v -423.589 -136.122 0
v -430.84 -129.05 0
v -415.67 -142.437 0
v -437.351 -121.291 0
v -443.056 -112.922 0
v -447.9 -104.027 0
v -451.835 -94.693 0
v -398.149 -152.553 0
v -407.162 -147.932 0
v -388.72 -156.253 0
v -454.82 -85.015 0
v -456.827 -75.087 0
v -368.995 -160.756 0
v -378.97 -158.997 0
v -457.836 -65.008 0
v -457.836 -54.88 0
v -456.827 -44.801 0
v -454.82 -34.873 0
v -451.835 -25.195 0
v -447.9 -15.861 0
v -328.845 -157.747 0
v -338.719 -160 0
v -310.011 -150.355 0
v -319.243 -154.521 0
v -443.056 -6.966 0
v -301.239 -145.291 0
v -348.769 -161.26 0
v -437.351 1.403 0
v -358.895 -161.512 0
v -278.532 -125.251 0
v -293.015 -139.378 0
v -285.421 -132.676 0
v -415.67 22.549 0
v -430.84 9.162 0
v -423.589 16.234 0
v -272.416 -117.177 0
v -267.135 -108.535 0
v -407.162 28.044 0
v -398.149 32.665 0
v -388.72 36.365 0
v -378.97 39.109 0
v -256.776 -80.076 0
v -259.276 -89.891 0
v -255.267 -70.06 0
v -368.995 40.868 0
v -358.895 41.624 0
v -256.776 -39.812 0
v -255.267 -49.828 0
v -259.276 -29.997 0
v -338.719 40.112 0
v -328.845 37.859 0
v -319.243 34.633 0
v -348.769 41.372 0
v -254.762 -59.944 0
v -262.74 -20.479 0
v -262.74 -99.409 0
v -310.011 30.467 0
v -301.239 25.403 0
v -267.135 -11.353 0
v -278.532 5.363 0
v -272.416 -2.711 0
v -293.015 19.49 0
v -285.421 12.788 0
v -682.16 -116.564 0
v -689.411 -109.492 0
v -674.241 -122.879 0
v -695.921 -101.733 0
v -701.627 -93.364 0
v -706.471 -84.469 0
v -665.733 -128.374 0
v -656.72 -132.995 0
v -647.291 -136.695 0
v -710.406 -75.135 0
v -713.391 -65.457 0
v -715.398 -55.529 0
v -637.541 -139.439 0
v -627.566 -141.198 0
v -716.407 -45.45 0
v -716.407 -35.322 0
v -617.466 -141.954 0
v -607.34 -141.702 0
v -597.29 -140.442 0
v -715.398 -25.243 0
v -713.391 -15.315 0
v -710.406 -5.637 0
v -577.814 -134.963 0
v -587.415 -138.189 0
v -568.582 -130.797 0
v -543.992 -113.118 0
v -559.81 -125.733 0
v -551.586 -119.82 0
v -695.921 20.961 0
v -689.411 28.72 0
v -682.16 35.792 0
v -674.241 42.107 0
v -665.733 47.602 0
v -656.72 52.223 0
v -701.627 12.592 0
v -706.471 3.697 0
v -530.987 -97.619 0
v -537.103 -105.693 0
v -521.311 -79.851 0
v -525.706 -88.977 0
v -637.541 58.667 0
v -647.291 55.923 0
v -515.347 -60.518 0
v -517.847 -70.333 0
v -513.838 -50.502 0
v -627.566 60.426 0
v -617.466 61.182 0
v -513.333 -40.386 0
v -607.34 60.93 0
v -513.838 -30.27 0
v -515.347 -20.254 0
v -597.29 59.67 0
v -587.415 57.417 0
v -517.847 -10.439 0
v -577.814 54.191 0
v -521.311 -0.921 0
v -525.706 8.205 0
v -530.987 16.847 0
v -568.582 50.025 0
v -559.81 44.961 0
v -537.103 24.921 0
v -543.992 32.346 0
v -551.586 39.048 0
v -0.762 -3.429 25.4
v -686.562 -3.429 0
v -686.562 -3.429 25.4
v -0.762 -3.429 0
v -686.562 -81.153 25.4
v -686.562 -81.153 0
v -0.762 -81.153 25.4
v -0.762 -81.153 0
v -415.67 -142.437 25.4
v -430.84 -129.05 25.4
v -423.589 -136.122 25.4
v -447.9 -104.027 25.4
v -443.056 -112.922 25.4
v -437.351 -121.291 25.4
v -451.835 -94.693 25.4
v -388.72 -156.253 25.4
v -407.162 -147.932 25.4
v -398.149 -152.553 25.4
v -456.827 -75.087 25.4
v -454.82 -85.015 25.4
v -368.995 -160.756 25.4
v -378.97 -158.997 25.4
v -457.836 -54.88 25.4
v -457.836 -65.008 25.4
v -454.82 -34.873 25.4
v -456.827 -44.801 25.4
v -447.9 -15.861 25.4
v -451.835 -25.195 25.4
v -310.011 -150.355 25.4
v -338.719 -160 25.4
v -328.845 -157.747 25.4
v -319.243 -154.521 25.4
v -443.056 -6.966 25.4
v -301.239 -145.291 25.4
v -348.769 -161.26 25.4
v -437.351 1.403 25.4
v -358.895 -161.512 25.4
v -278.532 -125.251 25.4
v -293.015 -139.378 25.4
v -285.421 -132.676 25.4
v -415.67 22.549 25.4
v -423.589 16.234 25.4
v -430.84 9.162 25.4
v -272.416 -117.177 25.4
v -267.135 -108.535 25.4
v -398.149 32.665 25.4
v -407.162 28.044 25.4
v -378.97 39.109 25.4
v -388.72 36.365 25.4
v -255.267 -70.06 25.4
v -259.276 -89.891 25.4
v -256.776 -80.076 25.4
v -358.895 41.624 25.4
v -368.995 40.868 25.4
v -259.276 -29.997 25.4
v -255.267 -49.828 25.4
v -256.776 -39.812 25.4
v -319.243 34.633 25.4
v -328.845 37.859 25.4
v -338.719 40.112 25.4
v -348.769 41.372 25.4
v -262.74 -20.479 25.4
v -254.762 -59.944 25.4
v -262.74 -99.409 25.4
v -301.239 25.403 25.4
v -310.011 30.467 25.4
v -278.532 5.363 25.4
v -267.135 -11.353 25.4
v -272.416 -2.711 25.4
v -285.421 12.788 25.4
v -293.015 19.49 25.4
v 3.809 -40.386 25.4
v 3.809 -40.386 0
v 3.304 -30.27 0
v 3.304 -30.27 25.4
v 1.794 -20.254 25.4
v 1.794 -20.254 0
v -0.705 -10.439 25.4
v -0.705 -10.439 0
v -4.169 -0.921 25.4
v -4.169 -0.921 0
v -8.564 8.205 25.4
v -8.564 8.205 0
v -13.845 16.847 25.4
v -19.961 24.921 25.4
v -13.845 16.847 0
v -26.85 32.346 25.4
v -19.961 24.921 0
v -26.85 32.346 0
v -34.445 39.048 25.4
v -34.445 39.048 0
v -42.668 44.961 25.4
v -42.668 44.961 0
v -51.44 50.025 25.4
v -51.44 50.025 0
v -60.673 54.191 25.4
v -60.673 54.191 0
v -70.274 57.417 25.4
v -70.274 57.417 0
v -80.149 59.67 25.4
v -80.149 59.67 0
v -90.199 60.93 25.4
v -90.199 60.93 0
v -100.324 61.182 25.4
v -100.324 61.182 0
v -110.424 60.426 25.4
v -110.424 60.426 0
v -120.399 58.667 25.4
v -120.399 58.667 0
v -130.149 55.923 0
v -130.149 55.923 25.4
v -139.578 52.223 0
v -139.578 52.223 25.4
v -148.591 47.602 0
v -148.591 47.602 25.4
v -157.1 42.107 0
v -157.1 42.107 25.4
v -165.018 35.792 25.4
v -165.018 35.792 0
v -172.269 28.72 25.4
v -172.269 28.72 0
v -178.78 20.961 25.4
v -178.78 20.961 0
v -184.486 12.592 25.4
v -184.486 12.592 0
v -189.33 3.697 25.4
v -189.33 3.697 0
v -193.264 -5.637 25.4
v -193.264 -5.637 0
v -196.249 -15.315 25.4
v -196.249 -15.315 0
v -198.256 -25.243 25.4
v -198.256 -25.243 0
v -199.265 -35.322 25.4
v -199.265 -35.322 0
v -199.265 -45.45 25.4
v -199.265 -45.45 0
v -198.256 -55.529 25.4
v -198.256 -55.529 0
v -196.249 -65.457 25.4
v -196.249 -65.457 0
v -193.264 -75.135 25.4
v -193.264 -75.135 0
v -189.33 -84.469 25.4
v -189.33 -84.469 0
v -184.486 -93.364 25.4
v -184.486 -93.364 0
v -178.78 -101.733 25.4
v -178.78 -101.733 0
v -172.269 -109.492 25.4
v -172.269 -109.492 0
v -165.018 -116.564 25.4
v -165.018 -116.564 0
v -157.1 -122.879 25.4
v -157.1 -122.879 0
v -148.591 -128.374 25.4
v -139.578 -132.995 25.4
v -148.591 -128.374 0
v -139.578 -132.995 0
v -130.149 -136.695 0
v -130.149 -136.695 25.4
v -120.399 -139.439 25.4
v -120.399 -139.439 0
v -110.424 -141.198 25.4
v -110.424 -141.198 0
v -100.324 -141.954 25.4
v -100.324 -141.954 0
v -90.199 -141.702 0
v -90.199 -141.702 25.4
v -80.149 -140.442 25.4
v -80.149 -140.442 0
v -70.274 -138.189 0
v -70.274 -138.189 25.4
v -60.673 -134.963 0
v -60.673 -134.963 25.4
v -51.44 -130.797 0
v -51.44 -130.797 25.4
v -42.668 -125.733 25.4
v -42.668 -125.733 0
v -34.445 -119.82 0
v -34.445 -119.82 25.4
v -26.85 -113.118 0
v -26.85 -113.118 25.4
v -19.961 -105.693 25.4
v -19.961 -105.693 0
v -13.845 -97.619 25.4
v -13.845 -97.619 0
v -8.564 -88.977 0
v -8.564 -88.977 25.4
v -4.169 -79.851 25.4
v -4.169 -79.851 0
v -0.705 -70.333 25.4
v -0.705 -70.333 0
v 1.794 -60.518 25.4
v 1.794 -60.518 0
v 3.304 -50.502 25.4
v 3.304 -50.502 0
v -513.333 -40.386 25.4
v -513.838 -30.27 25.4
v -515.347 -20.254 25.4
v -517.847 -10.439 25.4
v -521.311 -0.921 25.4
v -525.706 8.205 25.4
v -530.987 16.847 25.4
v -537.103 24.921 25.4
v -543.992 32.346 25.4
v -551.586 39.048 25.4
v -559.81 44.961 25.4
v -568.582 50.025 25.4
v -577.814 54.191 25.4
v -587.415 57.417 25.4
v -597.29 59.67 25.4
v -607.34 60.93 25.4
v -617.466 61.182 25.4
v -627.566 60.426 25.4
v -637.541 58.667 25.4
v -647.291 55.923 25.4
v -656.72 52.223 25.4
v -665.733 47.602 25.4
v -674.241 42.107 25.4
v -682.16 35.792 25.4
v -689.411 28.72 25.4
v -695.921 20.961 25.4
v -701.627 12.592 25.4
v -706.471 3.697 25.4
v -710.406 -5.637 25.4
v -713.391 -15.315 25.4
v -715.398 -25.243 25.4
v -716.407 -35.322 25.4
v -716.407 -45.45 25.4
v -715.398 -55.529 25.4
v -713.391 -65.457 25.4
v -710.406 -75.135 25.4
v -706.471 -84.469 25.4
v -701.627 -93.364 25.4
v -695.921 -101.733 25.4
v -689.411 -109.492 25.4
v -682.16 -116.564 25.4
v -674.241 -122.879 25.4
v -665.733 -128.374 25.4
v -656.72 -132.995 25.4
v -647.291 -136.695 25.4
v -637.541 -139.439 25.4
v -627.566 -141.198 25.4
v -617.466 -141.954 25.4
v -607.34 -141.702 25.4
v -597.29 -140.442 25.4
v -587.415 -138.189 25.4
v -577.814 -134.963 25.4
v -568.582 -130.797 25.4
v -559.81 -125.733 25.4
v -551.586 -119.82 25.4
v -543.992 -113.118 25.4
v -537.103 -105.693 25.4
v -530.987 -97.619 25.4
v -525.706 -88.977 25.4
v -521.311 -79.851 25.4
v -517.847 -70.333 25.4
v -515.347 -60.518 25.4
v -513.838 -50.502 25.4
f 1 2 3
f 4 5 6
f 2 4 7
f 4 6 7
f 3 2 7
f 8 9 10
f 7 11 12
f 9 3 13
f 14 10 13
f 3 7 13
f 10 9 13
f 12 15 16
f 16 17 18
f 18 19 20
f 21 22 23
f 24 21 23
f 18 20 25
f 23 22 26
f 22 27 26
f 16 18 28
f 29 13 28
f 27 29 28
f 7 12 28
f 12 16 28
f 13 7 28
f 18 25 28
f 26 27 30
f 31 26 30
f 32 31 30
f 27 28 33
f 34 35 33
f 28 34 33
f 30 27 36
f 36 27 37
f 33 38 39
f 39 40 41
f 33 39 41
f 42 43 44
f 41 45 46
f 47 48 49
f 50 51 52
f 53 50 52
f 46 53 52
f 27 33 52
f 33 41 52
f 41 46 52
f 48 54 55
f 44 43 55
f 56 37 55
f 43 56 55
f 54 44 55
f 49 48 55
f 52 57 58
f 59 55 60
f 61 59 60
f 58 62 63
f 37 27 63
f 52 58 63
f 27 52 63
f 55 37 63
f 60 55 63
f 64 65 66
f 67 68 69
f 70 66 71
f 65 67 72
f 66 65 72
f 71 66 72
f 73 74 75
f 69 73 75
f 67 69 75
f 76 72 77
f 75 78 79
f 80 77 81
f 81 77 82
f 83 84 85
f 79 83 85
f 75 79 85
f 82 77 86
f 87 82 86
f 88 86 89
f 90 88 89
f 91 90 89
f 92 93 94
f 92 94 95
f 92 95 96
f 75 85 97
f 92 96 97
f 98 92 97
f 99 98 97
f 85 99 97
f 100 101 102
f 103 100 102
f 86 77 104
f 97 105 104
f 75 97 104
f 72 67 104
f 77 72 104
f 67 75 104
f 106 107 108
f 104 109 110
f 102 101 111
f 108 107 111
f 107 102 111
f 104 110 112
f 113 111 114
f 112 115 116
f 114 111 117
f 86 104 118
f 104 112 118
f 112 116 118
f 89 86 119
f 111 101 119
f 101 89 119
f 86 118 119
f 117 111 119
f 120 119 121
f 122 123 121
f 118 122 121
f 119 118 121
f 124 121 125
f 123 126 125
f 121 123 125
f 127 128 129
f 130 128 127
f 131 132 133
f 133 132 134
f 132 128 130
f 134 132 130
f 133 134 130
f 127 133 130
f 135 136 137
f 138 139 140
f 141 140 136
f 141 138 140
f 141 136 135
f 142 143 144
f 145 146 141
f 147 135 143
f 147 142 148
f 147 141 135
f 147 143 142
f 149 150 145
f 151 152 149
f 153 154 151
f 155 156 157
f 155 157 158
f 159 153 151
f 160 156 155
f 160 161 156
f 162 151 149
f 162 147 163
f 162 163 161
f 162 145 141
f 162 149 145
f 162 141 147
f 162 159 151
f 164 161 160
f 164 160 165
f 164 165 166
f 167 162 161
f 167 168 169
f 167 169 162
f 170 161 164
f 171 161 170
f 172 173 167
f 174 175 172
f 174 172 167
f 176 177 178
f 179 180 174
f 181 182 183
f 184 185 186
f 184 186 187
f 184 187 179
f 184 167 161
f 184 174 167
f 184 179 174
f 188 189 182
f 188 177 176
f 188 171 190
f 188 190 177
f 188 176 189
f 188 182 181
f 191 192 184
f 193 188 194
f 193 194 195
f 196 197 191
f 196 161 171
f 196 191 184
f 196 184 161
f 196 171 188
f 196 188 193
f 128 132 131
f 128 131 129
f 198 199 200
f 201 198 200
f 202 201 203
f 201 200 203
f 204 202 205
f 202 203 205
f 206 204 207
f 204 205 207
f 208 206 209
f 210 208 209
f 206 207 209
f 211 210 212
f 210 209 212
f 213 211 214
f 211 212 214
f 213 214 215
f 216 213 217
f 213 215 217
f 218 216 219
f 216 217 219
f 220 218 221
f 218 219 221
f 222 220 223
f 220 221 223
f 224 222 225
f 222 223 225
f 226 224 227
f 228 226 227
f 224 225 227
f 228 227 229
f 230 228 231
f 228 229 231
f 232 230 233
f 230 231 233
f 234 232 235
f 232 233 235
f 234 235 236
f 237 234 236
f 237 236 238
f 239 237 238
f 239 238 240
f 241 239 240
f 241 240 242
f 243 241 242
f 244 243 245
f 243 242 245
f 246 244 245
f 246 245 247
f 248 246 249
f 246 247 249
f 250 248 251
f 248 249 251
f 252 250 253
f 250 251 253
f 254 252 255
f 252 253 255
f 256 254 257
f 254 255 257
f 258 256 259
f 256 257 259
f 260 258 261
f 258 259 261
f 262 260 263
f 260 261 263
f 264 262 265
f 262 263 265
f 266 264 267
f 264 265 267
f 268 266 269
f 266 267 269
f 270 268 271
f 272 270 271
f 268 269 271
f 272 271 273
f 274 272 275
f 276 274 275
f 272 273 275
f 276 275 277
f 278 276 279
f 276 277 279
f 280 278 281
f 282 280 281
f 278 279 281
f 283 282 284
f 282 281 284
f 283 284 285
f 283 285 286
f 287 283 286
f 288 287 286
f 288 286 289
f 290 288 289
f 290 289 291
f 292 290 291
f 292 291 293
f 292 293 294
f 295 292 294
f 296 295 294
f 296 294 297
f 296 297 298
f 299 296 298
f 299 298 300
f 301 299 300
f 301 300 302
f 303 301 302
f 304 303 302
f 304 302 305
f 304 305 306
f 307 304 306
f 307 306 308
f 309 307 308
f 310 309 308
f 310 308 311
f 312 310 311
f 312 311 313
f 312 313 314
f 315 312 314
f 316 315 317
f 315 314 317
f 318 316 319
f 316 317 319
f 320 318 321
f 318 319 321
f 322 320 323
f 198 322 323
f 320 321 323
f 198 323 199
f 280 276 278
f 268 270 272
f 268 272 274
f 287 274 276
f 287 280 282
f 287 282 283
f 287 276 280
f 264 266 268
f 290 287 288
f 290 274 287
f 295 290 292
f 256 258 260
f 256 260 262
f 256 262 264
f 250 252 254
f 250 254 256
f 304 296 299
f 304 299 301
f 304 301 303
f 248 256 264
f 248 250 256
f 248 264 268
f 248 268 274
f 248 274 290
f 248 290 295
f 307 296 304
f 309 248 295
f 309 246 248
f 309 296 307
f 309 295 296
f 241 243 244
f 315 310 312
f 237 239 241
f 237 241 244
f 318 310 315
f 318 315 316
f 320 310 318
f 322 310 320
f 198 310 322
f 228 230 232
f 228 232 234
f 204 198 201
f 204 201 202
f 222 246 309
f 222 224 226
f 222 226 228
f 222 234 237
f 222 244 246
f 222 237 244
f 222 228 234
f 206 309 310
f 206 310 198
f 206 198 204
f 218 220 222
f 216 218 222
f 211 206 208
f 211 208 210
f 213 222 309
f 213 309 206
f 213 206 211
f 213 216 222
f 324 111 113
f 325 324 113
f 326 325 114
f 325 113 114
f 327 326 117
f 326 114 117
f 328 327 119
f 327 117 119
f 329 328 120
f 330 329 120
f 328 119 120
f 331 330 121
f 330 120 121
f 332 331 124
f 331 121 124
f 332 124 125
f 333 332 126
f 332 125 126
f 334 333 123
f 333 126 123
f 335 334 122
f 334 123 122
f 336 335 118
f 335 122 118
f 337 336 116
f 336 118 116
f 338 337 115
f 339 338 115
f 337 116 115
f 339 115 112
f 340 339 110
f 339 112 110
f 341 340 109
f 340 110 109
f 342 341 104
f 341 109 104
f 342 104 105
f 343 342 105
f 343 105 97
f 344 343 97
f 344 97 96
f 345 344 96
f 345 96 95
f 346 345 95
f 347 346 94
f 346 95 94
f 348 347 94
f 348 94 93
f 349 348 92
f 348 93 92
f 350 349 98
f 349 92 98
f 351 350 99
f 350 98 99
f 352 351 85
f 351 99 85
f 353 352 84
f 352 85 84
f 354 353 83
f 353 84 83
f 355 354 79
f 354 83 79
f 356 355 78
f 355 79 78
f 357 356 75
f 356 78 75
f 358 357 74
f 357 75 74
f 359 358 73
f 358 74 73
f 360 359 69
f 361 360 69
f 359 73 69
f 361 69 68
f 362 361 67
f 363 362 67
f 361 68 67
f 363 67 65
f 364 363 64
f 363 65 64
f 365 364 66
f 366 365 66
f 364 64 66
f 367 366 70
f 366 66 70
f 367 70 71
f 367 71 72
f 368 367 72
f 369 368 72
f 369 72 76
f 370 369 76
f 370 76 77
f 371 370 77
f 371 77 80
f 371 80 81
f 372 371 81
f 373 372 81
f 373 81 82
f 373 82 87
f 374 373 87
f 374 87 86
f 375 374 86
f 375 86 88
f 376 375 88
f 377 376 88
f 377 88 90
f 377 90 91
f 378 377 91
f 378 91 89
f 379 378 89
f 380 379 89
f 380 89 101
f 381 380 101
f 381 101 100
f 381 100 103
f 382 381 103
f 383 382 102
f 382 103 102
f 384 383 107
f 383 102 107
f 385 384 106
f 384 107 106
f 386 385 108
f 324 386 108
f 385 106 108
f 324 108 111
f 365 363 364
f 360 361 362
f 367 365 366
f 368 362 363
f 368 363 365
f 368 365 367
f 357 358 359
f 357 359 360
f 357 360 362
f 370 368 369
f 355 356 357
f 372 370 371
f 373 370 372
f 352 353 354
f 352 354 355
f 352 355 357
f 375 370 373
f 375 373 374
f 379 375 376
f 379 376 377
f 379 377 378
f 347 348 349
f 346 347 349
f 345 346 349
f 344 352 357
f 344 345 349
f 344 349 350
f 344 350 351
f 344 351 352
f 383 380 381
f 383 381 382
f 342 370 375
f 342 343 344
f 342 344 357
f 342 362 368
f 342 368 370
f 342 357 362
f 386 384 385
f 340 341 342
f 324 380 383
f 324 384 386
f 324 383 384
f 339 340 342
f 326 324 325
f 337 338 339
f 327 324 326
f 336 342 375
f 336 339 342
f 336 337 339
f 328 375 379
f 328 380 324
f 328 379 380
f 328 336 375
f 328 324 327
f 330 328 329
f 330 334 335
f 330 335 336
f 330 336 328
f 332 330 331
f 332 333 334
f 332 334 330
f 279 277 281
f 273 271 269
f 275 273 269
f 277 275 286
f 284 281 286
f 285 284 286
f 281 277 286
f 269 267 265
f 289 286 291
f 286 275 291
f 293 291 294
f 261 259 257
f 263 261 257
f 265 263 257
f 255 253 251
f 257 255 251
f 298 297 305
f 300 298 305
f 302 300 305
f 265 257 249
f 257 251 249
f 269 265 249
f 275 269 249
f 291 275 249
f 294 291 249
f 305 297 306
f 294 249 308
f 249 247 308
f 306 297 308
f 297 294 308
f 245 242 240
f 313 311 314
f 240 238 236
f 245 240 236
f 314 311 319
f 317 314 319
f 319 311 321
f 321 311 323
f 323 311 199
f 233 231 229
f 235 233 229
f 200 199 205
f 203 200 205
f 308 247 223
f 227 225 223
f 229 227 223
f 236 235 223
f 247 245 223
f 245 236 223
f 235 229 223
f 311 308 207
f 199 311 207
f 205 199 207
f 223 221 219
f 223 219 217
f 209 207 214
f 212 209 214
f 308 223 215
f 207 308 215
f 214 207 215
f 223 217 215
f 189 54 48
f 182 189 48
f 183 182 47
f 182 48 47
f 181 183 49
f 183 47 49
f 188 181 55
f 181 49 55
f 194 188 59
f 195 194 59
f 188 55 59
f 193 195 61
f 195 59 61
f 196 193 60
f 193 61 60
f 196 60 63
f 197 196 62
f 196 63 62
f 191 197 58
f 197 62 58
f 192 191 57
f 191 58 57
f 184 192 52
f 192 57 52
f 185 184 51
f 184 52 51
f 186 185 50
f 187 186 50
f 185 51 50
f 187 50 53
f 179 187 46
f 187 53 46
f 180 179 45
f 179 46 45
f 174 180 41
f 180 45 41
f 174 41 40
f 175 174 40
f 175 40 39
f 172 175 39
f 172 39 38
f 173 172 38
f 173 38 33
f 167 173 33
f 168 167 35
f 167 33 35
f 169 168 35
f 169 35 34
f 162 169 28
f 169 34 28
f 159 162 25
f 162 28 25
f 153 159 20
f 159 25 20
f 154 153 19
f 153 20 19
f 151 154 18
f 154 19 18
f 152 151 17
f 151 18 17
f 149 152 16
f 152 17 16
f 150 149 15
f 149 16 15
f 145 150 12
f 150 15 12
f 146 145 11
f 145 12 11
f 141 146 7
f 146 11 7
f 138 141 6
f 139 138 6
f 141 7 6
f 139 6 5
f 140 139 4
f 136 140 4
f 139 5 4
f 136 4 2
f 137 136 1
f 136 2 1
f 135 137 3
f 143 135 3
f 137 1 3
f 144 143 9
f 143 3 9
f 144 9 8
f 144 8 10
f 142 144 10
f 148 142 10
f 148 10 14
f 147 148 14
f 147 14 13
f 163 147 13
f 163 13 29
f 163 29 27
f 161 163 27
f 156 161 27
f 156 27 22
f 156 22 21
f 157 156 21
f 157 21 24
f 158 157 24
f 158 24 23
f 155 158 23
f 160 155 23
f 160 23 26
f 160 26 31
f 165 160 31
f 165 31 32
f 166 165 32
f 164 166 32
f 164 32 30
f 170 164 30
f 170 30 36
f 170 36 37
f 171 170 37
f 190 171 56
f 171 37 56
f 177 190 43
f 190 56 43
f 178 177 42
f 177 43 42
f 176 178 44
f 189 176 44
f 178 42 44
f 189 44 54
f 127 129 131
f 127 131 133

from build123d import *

# Parameters (mm, degrees)
SKETCH4_R             = 101.6
BOSS_EXTRUDE1_DEPTH   = 25.4
BOSS_EXTRUDE1_2_DEPTH = 25.4
BOSS_EXTRUDE1_3_DEPTH = 25.4
SKETCH5_W             = 685.8
SKETCH5_H             = 77.724
BOSS_EXTRUDE2_DEPTH   = 25.4


with BuildPart() as part:
    # Sketch4 → Boss-Extrude1 (new body)
    with BuildSketch(Plane.XY):
        with Locations((-97.791162832, -40.386)):
            Circle(SKETCH4_R)
    extrude(amount=BOSS_EXTRUDE1_DEPTH)


with BuildPart() as body_2:
    # Sketch4 → Boss-Extrude1 2 (new body)
    with BuildSketch(Plane.XY):
        with Locations((-356.362, -59.944)):
            Circle(SKETCH4_R)
    extrude(amount=BOSS_EXTRUDE1_2_DEPTH)


with BuildPart() as body_3:
    # Sketch4 → Boss-Extrude1 3 (new body)
    with BuildSketch(Plane.XY):
        with Locations((-614.932837168, -40.386)):
            Circle(SKETCH4_R)
    extrude(amount=BOSS_EXTRUDE1_3_DEPTH)


with BuildPart() as body_4:
    # Sketch5 → Boss-Extrude2 (new body)
    with BuildSketch(Plane.XY):
        with Locations((-343.662, -42.291)):
            Rectangle(SKETCH5_W, SKETCH5_H)
    extrude(amount=BOSS_EXTRUDE2_DEPTH)


solid = Compound([part.part, body_2.part, body_3.part, body_4.part])
